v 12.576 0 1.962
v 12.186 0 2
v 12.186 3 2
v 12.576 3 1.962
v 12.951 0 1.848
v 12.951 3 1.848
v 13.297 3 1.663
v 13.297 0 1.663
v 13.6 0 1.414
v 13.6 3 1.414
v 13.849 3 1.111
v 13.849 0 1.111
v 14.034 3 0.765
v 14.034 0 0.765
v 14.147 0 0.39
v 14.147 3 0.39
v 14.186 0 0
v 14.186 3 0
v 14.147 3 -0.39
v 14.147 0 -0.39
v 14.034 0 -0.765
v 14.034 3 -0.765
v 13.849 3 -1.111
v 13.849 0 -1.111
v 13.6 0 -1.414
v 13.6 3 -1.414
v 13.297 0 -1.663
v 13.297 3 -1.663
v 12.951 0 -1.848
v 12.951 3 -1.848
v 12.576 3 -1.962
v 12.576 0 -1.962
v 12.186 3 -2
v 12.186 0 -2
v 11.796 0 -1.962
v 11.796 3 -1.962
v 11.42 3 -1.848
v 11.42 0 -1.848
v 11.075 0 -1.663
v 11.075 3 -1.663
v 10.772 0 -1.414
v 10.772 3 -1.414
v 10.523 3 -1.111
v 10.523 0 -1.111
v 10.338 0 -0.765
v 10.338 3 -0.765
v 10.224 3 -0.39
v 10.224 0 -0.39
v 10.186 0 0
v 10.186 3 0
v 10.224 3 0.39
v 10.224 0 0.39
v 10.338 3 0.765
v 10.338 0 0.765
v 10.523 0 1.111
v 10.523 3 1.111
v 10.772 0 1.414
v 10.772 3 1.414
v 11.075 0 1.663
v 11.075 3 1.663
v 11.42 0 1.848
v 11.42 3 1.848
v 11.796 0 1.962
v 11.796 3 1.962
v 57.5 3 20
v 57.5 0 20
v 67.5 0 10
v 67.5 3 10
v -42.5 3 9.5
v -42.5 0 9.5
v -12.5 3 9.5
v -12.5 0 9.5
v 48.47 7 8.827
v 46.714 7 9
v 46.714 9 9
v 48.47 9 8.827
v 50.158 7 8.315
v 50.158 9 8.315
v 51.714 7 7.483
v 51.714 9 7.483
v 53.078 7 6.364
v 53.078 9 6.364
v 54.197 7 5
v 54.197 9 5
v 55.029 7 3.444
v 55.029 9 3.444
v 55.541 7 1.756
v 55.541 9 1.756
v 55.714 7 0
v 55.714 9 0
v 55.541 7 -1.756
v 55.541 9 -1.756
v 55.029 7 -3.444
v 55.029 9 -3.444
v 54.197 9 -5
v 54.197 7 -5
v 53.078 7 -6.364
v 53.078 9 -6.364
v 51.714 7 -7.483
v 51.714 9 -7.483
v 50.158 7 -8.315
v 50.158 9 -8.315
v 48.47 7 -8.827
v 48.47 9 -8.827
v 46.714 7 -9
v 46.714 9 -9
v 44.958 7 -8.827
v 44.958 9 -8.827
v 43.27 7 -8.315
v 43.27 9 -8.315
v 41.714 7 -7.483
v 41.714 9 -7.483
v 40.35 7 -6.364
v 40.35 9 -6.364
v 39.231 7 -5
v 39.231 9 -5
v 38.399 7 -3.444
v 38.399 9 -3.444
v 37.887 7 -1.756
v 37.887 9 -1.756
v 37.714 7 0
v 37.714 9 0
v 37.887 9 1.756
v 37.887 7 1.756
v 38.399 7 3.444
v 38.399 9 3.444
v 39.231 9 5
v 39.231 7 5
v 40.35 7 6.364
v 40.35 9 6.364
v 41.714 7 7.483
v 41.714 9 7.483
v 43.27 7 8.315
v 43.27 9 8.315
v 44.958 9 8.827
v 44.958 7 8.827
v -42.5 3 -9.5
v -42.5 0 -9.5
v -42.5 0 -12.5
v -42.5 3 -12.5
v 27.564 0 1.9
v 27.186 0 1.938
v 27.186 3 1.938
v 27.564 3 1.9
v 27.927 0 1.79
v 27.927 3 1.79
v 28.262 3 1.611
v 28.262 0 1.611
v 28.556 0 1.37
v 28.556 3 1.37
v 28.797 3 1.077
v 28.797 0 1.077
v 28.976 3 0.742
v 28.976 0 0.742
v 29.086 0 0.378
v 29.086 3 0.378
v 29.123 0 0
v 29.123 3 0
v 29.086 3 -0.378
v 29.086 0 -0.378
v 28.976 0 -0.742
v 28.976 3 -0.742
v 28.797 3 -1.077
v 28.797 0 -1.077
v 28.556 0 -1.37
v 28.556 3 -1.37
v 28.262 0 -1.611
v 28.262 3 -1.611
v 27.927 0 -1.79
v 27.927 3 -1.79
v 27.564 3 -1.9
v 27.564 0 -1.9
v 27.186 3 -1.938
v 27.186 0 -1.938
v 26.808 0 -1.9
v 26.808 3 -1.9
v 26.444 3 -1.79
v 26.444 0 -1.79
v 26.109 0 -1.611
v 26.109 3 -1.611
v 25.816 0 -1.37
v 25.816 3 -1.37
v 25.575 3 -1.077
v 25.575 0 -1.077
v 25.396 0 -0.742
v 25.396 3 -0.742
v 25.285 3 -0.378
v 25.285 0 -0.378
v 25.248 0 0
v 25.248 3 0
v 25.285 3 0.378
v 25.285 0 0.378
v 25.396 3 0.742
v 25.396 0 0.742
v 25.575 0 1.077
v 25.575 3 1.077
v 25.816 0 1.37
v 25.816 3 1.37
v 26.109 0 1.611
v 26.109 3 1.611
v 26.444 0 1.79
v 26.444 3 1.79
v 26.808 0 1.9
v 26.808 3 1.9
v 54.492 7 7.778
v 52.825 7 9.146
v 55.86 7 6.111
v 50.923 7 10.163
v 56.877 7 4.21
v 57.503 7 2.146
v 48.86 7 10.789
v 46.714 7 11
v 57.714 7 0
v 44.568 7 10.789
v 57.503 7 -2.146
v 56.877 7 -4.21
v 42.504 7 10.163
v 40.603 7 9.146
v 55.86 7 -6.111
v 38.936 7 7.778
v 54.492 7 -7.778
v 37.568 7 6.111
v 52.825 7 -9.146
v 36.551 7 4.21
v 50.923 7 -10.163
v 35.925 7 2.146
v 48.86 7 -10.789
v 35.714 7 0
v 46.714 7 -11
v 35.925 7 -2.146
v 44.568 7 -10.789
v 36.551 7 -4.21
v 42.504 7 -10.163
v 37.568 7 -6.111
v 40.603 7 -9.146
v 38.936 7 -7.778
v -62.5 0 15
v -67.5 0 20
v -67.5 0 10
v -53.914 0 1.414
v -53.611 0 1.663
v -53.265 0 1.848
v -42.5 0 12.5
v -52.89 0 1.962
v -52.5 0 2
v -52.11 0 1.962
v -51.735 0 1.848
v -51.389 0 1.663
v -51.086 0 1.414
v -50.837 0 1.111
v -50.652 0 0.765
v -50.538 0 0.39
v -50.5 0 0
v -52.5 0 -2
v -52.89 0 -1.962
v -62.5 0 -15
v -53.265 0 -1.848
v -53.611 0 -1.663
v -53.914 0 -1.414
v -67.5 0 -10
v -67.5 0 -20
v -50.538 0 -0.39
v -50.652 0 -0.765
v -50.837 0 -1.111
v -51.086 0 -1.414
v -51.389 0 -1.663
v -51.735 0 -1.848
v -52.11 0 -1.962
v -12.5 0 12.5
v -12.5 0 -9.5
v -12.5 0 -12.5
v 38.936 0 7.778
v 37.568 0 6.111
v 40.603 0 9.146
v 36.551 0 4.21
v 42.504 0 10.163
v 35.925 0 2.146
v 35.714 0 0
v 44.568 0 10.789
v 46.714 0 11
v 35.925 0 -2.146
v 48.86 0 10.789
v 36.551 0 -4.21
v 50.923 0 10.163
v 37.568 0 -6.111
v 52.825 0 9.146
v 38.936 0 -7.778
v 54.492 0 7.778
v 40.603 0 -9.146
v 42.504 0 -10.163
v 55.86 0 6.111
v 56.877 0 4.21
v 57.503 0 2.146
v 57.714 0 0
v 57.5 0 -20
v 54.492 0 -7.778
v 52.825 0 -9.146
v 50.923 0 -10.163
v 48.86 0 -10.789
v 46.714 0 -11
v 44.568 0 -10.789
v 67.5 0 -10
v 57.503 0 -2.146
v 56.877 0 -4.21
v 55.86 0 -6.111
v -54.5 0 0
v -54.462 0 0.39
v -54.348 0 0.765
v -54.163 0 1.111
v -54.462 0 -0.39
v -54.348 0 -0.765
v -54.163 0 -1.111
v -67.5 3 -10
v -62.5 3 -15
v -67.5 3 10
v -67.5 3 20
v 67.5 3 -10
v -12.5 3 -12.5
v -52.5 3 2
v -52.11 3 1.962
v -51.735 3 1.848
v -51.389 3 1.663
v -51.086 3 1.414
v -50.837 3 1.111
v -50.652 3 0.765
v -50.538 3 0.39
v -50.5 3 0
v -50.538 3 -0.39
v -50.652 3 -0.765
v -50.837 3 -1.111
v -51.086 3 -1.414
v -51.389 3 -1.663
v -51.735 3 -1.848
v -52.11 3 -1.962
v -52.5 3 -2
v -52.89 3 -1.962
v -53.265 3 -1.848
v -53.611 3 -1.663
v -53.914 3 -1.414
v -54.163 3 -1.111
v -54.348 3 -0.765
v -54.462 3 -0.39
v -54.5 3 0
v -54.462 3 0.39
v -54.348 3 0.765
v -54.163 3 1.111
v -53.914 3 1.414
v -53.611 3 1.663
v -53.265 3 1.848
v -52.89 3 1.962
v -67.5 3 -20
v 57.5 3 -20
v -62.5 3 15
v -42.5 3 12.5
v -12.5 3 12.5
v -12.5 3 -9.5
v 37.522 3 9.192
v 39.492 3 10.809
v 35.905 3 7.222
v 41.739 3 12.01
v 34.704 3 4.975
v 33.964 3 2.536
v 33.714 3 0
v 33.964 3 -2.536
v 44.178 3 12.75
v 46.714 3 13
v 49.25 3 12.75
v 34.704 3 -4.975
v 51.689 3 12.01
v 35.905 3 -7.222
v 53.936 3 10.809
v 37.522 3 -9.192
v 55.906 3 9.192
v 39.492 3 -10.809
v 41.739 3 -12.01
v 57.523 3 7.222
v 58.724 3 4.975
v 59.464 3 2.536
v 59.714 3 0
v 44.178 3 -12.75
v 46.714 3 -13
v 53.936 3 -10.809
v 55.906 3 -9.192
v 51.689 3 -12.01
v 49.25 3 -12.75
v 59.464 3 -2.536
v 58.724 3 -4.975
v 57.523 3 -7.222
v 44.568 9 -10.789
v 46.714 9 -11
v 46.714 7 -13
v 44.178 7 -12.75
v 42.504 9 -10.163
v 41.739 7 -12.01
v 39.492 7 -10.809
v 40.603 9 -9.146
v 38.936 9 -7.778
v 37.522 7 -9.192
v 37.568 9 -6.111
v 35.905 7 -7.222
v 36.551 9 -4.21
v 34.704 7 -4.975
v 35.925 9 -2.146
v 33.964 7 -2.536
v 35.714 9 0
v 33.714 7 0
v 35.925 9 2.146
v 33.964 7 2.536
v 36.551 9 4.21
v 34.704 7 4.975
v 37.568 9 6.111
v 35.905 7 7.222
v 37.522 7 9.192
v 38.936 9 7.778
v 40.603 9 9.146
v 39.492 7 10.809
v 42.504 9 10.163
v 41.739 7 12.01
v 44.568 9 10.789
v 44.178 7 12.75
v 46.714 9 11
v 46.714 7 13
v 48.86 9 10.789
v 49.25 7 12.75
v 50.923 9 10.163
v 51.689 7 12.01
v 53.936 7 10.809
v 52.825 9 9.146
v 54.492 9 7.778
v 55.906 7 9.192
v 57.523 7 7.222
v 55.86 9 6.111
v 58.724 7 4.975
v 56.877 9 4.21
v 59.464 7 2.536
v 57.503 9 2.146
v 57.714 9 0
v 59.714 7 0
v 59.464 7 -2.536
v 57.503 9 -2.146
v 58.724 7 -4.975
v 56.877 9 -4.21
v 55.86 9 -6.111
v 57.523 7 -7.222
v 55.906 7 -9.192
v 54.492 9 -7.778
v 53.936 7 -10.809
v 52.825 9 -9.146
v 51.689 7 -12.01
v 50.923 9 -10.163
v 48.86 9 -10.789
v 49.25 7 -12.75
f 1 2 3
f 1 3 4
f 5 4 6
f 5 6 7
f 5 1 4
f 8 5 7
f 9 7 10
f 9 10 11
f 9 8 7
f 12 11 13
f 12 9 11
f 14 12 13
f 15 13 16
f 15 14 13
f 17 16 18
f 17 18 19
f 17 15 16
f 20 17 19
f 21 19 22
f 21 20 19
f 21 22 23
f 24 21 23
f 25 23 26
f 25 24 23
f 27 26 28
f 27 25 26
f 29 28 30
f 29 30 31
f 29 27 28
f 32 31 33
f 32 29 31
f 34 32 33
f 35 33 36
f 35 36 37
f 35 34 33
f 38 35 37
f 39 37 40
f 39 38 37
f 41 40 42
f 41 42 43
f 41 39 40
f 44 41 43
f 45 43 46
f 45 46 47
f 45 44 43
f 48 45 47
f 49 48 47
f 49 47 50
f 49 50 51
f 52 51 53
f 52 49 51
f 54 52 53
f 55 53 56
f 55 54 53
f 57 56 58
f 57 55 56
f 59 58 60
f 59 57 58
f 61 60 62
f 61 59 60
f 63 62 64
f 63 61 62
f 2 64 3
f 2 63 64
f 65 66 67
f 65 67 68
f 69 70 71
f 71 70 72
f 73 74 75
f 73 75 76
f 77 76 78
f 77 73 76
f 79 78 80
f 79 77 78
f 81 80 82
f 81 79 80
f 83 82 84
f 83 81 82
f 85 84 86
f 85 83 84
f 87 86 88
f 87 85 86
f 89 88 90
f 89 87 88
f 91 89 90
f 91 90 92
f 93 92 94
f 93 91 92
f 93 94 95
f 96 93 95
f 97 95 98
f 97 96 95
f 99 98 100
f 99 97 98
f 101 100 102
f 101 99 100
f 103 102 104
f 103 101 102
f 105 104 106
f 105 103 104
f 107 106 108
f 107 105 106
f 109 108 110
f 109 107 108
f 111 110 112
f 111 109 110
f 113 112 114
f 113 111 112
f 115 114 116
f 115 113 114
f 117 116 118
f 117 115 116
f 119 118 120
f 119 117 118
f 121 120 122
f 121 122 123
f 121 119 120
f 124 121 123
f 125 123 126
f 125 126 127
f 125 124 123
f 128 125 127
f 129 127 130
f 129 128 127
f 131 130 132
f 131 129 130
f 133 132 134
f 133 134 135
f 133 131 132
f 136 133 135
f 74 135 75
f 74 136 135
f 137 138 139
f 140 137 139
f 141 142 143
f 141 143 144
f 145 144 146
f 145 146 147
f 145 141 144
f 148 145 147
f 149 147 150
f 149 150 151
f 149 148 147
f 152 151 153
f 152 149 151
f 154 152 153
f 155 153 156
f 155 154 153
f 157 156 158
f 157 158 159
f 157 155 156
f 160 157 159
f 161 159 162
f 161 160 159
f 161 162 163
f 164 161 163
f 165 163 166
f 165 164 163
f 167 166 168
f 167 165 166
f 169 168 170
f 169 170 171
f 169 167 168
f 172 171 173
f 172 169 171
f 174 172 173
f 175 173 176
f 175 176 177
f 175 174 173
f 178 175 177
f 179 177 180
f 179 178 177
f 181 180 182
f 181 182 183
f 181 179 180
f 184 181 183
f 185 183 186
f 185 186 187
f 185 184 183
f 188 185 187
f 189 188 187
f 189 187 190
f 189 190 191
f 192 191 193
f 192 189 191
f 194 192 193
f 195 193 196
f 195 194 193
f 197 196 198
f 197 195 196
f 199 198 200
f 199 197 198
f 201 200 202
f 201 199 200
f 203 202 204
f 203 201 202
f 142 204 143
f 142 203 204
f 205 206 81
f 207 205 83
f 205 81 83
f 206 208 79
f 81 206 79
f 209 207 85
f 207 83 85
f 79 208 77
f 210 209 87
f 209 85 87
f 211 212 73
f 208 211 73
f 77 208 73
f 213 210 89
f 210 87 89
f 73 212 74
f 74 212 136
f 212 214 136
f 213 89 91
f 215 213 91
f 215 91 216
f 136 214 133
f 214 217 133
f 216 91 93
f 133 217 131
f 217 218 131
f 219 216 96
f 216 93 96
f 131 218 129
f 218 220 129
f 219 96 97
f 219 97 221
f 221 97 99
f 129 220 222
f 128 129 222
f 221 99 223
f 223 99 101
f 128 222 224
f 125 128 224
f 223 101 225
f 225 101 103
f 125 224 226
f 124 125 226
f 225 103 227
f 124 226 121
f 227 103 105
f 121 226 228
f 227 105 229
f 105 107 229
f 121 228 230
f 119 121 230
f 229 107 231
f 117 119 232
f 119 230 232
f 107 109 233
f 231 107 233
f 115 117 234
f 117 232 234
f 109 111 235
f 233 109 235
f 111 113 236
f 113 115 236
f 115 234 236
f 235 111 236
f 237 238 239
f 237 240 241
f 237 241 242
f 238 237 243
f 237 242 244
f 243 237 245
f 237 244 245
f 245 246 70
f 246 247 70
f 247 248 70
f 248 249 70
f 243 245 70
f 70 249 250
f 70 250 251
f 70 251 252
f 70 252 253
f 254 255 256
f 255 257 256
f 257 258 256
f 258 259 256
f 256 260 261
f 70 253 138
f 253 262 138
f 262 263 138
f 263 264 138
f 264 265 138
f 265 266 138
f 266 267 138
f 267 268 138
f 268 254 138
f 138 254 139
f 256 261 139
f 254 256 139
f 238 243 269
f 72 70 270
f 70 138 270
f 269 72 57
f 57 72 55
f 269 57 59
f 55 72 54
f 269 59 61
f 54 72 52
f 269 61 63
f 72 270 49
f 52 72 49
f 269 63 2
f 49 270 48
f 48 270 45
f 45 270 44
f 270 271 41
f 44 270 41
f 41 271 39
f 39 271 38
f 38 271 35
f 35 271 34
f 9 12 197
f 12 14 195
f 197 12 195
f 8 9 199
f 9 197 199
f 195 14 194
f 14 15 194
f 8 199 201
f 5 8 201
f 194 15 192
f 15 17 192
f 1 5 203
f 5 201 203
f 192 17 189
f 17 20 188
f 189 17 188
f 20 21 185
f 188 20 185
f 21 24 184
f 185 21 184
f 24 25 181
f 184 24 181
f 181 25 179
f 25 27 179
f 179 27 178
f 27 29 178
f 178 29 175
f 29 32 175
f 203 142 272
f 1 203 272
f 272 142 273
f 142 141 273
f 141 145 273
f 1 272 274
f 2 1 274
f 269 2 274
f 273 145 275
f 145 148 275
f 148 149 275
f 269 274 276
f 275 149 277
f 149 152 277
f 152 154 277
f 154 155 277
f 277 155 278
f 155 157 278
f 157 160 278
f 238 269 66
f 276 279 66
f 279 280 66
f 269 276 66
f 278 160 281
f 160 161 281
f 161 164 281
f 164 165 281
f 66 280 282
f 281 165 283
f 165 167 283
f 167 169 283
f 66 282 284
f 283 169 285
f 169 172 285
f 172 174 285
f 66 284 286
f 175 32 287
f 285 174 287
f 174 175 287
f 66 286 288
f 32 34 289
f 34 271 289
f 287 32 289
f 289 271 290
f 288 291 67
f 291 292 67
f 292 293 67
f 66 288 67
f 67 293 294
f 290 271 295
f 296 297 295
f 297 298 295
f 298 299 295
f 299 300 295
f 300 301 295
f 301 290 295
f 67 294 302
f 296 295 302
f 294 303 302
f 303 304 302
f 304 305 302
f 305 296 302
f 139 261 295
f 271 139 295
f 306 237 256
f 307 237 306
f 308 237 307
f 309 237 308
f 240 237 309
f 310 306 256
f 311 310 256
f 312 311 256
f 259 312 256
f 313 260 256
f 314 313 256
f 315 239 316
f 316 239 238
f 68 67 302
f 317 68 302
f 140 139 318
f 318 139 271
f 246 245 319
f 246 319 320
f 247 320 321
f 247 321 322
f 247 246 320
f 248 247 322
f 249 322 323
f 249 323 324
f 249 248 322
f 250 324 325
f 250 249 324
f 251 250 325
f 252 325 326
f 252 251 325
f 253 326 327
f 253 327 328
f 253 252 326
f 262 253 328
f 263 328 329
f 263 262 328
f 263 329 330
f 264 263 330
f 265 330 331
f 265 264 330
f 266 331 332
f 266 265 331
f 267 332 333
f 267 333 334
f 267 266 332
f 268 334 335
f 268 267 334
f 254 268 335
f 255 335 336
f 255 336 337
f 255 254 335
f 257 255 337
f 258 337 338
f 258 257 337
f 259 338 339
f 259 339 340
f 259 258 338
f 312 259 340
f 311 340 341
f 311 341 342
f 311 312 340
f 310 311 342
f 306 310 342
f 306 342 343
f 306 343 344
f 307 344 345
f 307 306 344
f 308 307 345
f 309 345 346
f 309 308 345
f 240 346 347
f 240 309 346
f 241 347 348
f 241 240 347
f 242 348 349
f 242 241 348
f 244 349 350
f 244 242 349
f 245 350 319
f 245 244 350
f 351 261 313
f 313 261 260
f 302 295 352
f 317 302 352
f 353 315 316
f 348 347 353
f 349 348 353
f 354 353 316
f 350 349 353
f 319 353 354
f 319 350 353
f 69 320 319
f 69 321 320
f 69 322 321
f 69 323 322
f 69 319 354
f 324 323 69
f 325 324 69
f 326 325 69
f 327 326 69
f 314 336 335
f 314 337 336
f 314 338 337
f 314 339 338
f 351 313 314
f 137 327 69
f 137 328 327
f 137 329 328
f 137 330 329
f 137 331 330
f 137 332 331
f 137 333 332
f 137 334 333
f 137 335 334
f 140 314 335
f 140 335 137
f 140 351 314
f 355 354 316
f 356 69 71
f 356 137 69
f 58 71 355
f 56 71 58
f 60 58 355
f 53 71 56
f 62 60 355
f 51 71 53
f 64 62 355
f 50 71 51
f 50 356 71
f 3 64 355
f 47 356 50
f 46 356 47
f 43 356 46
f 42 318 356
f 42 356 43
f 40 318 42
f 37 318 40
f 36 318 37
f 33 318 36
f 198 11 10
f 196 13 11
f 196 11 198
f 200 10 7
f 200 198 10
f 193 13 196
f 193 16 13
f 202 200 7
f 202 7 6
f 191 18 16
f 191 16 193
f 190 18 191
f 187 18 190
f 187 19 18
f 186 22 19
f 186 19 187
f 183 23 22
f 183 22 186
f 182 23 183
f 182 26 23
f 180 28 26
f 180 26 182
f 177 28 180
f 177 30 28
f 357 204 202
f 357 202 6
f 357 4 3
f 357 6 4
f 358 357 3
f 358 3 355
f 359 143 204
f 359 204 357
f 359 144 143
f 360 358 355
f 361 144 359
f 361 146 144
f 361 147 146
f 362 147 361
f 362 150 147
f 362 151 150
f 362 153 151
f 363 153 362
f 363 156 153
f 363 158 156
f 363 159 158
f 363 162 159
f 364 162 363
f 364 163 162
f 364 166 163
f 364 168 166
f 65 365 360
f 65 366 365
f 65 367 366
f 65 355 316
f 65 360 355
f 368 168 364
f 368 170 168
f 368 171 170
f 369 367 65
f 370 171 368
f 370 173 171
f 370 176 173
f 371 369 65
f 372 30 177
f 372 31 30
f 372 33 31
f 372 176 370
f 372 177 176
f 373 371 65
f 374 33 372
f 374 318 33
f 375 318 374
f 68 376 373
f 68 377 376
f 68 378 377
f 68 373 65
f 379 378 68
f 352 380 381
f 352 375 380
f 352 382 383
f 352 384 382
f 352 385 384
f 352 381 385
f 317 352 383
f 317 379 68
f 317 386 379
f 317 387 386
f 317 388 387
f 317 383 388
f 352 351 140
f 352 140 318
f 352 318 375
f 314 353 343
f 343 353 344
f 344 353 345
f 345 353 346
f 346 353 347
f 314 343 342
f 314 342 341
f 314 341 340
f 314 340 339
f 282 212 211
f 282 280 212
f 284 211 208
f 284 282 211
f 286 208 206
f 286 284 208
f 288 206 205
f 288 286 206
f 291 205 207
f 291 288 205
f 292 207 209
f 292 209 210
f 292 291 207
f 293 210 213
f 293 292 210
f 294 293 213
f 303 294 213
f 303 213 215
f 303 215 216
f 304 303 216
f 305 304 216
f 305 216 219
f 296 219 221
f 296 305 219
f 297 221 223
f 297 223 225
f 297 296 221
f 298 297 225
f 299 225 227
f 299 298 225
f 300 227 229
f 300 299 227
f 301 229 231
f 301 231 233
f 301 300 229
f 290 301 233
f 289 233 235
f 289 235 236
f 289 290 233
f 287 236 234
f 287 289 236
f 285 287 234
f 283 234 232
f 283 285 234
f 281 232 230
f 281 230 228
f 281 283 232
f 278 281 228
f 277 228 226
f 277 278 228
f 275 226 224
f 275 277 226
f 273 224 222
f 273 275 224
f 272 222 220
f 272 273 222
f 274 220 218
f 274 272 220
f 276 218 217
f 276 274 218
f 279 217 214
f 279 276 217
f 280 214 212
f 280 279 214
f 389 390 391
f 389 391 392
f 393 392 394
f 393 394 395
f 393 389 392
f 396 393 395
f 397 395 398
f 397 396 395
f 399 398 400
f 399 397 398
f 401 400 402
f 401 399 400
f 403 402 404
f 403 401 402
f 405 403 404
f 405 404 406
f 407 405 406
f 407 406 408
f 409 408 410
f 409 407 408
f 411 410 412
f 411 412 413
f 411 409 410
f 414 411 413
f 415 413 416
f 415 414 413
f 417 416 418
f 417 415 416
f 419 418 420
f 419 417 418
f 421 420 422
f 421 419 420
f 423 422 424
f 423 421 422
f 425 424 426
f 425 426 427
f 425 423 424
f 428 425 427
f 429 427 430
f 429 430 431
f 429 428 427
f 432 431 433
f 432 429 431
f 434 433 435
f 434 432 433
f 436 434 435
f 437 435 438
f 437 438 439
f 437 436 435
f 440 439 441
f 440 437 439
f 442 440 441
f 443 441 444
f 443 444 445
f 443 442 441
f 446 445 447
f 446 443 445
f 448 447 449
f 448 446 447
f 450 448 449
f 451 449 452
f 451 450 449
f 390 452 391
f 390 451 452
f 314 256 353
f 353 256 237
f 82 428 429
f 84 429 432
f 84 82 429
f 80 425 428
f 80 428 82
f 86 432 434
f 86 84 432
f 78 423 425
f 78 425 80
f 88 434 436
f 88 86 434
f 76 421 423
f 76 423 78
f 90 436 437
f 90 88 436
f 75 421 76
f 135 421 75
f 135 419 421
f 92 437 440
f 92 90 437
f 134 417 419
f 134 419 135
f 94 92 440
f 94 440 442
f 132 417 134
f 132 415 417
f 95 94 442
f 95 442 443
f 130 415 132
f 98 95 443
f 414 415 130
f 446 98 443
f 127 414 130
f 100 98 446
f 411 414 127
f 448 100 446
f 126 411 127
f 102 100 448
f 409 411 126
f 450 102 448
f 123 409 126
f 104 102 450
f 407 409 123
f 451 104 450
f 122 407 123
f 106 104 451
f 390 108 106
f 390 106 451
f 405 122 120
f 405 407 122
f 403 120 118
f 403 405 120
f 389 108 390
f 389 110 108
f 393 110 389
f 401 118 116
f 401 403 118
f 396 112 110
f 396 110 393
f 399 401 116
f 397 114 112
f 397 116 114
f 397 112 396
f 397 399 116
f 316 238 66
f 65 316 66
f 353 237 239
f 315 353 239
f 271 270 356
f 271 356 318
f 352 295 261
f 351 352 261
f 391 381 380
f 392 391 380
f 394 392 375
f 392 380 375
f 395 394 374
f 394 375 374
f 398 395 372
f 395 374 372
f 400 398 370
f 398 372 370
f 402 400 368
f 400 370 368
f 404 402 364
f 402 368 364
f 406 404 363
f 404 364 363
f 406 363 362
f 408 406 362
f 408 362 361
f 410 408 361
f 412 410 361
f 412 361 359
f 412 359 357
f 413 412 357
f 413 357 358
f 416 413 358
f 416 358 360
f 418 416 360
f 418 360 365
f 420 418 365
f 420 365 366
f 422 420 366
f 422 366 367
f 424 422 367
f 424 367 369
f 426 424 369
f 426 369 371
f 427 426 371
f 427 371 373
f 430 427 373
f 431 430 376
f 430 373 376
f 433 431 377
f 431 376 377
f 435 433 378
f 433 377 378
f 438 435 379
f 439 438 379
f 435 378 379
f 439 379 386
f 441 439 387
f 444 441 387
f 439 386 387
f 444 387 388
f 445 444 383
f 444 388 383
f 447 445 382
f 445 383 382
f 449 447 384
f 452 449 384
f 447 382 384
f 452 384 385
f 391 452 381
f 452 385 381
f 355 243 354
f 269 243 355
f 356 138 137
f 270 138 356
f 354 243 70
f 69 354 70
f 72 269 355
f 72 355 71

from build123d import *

# Parameters (mm, degrees)
CROQUIS1_R              = 11
CROQUIS1_R_2            = 2
CROQUIS1_R_3            = 1.937672591
CROQUIS1_W              = 30
CROQUIS1_H              = 3
SALIENTE_EXTRUIR1_DEPTH = 3
CROQUIS2_R              = 13
CROQUIS2_R_2            = 11
SALIENTE_EXTRUIR2_DEPTH = 4
CROQUIS3_R              = 13
CROQUIS3_R_2            = 9
SALIENTE_EXTRUIR3_DEPTH = 2
CHAFL_N1_SIZE           = 2
CHAFL_N2_SIZE           = 10


with BuildPart() as part:
    # Croquis1 → Saliente-Extruir1 (new body)
    with BuildSketch(Plane(origin=(0, 0, 0), x_dir=(1, 0, 0), z_dir=(0, 1, 0))):
        Polygon((-67.5, 10), (-62.5, 15), (-62.5, -15), (-67.5, -10), (-67.5, -20), (67.5, -20), (67.5, 20), (-67.5, 20), align=None)
        with Locations(Location((46.713951104, 0, 0), (0, 0, 270))):
            Circle(CROQUIS1_R, mode=Mode.SUBTRACT)
        with Locations(Location((-52.5, 0, 0), (0, 0, 270))):
            Circle(CROQUIS1_R_2, mode=Mode.SUBTRACT)
        with Locations(Location((27.185770037, 0, 0), (0, 0, 270))):
            Circle(CROQUIS1_R_3, mode=Mode.SUBTRACT)
        with Locations(Location((12.185770037, 0, 0), (0, 0, 270))):
            Circle(CROQUIS1_R_2, mode=Mode.SUBTRACT)
        with Locations((-27.5, 11)):
            Rectangle(CROQUIS1_W, CROQUIS1_H, mode=Mode.SUBTRACT)
        with Locations((-27.5, -11)):
            Rectangle(CROQUIS1_W, CROQUIS1_H, mode=Mode.SUBTRACT)
    extrude(amount=SALIENTE_EXTRUIR1_DEPTH)

    # Croquis2 → Saliente-Extruir2 (add)
    with BuildSketch(Plane(origin=(0, 3, 0), x_dir=(1, 0, 0), z_dir=(0, 1, 0))):
        with Locations(Location((46.713951104, 0, 0), (0, 0, 90))):
            Circle(CROQUIS2_R)
        with Locations(Location((46.713951104, 0, 0), (0, 0, 270))):
            Circle(CROQUIS2_R_2, mode=Mode.SUBTRACT)
    extrude(amount=SALIENTE_EXTRUIR2_DEPTH)

    # Croquis3 → Saliente-Extruir3 (add)
    with BuildSketch(Plane(origin=(0, 7, 0), x_dir=(1, 0, 0), z_dir=(0, 1, 0))):
        with Locations(Location((46.713951104, 0, 0), (0, 0, 90))):
            Circle(CROQUIS3_R)
        with Locations(Location((46.713951104, 0, 0), (0, 0, 270))):
            Circle(CROQUIS3_R_2, mode=Mode.SUBTRACT)
    extrude(amount=SALIENTE_EXTRUIR3_DEPTH)

    # Chaflán1
    chafl_n1_edges = [part.edges().sort_by_distance(p)[0] for p in [
        (46.713951104, 9, 13),
    ]]
    chamfer(chafl_n1_edges, length=CHAFL_N1_SIZE)

    # Chaflán2
    chafl_n2_edges = [part.edges().sort_by_distance(p)[0] for p in [
        (67.5, 1.5, 20),
        (67.5, 1.5, -20),
    ]]
    chamfer(chafl_n2_edges, length=CHAFL_N2_SIZE)


solid = part.part
